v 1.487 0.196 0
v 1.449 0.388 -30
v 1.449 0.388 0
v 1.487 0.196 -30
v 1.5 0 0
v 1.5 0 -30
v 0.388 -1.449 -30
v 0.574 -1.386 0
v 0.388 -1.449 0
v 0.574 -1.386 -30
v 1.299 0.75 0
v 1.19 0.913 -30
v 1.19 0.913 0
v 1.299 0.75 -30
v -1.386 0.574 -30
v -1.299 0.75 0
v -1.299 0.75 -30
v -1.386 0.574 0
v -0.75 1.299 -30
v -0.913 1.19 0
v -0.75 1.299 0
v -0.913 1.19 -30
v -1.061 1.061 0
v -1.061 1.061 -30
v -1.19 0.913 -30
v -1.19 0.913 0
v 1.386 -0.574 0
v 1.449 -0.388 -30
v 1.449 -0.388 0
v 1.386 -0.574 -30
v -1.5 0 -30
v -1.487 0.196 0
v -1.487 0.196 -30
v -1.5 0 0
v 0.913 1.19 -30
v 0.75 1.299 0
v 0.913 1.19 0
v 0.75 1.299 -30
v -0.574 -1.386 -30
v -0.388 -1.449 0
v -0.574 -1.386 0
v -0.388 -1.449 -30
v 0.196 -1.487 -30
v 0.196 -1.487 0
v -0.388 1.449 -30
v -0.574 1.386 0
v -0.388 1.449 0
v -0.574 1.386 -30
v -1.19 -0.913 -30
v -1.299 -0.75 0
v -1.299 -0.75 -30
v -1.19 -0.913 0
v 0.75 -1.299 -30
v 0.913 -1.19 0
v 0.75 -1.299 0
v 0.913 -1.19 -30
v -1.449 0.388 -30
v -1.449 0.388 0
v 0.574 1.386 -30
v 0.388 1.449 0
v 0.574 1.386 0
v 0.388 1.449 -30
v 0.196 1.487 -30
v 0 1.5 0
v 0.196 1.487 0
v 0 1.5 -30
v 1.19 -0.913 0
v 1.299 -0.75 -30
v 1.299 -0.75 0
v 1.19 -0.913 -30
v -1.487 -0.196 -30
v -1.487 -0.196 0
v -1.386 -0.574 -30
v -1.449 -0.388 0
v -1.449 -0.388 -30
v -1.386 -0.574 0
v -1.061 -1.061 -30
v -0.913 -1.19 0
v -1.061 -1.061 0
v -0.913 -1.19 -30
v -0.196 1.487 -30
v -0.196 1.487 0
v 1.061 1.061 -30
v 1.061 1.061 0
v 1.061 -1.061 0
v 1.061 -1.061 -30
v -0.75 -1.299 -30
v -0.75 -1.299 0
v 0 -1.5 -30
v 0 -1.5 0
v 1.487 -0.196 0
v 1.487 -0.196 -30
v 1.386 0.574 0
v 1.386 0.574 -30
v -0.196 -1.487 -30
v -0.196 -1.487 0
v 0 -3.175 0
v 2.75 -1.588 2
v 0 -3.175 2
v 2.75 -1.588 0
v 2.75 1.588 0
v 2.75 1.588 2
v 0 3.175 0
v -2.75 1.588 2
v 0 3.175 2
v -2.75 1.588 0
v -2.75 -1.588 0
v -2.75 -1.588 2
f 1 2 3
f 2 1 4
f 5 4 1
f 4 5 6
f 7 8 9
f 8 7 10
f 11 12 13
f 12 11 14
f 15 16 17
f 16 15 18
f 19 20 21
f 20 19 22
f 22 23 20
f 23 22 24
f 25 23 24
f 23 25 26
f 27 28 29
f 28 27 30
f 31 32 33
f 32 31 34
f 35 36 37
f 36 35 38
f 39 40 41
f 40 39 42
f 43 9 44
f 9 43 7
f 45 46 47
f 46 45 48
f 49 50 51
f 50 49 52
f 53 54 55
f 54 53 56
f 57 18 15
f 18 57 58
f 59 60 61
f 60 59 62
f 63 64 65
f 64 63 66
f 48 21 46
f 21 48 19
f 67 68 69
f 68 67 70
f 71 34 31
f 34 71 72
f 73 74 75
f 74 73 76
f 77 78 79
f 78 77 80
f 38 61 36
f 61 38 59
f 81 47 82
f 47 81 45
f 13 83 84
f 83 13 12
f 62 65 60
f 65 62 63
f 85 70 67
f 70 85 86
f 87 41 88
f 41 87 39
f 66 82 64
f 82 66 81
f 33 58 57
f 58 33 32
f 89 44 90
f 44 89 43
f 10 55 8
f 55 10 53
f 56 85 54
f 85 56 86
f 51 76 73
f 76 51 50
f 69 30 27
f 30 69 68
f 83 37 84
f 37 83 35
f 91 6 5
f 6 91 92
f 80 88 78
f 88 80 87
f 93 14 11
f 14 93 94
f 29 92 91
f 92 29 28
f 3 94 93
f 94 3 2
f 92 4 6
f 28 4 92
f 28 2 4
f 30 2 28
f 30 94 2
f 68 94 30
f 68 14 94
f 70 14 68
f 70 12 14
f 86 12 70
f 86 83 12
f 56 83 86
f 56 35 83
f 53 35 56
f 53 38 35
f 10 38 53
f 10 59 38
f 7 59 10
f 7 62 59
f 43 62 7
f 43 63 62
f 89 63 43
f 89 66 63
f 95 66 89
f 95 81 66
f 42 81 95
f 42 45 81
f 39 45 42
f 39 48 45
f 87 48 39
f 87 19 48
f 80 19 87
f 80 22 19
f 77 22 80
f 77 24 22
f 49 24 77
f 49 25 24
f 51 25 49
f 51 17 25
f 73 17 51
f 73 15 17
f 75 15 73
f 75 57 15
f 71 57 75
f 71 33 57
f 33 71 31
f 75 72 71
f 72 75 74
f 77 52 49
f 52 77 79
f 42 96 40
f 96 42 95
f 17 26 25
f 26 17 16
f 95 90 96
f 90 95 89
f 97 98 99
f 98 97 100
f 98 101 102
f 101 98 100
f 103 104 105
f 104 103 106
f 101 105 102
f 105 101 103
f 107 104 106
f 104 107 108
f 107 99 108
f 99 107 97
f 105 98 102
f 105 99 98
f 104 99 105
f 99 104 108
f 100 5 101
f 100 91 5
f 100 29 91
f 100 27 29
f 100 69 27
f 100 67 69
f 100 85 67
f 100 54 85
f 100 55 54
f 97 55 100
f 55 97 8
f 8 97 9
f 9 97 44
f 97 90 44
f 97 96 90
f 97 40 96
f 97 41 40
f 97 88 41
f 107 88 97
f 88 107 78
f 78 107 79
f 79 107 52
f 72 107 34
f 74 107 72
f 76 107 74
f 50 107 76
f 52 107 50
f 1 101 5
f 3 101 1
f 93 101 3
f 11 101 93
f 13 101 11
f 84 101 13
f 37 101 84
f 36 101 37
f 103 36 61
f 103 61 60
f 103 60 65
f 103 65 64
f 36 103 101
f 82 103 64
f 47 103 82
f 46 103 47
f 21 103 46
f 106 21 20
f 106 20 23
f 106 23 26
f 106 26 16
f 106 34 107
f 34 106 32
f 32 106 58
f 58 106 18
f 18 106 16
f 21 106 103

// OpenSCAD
// Purchased hex-head fastener proxy, M3x30; not a printed part.
$fn=48;
union(){ translate([0,0,-30]) cylinder(d=3,h=30.01); rotate([0,0,30]) cylinder(d=5.5/cos(30),h=2,$fn=6); }
